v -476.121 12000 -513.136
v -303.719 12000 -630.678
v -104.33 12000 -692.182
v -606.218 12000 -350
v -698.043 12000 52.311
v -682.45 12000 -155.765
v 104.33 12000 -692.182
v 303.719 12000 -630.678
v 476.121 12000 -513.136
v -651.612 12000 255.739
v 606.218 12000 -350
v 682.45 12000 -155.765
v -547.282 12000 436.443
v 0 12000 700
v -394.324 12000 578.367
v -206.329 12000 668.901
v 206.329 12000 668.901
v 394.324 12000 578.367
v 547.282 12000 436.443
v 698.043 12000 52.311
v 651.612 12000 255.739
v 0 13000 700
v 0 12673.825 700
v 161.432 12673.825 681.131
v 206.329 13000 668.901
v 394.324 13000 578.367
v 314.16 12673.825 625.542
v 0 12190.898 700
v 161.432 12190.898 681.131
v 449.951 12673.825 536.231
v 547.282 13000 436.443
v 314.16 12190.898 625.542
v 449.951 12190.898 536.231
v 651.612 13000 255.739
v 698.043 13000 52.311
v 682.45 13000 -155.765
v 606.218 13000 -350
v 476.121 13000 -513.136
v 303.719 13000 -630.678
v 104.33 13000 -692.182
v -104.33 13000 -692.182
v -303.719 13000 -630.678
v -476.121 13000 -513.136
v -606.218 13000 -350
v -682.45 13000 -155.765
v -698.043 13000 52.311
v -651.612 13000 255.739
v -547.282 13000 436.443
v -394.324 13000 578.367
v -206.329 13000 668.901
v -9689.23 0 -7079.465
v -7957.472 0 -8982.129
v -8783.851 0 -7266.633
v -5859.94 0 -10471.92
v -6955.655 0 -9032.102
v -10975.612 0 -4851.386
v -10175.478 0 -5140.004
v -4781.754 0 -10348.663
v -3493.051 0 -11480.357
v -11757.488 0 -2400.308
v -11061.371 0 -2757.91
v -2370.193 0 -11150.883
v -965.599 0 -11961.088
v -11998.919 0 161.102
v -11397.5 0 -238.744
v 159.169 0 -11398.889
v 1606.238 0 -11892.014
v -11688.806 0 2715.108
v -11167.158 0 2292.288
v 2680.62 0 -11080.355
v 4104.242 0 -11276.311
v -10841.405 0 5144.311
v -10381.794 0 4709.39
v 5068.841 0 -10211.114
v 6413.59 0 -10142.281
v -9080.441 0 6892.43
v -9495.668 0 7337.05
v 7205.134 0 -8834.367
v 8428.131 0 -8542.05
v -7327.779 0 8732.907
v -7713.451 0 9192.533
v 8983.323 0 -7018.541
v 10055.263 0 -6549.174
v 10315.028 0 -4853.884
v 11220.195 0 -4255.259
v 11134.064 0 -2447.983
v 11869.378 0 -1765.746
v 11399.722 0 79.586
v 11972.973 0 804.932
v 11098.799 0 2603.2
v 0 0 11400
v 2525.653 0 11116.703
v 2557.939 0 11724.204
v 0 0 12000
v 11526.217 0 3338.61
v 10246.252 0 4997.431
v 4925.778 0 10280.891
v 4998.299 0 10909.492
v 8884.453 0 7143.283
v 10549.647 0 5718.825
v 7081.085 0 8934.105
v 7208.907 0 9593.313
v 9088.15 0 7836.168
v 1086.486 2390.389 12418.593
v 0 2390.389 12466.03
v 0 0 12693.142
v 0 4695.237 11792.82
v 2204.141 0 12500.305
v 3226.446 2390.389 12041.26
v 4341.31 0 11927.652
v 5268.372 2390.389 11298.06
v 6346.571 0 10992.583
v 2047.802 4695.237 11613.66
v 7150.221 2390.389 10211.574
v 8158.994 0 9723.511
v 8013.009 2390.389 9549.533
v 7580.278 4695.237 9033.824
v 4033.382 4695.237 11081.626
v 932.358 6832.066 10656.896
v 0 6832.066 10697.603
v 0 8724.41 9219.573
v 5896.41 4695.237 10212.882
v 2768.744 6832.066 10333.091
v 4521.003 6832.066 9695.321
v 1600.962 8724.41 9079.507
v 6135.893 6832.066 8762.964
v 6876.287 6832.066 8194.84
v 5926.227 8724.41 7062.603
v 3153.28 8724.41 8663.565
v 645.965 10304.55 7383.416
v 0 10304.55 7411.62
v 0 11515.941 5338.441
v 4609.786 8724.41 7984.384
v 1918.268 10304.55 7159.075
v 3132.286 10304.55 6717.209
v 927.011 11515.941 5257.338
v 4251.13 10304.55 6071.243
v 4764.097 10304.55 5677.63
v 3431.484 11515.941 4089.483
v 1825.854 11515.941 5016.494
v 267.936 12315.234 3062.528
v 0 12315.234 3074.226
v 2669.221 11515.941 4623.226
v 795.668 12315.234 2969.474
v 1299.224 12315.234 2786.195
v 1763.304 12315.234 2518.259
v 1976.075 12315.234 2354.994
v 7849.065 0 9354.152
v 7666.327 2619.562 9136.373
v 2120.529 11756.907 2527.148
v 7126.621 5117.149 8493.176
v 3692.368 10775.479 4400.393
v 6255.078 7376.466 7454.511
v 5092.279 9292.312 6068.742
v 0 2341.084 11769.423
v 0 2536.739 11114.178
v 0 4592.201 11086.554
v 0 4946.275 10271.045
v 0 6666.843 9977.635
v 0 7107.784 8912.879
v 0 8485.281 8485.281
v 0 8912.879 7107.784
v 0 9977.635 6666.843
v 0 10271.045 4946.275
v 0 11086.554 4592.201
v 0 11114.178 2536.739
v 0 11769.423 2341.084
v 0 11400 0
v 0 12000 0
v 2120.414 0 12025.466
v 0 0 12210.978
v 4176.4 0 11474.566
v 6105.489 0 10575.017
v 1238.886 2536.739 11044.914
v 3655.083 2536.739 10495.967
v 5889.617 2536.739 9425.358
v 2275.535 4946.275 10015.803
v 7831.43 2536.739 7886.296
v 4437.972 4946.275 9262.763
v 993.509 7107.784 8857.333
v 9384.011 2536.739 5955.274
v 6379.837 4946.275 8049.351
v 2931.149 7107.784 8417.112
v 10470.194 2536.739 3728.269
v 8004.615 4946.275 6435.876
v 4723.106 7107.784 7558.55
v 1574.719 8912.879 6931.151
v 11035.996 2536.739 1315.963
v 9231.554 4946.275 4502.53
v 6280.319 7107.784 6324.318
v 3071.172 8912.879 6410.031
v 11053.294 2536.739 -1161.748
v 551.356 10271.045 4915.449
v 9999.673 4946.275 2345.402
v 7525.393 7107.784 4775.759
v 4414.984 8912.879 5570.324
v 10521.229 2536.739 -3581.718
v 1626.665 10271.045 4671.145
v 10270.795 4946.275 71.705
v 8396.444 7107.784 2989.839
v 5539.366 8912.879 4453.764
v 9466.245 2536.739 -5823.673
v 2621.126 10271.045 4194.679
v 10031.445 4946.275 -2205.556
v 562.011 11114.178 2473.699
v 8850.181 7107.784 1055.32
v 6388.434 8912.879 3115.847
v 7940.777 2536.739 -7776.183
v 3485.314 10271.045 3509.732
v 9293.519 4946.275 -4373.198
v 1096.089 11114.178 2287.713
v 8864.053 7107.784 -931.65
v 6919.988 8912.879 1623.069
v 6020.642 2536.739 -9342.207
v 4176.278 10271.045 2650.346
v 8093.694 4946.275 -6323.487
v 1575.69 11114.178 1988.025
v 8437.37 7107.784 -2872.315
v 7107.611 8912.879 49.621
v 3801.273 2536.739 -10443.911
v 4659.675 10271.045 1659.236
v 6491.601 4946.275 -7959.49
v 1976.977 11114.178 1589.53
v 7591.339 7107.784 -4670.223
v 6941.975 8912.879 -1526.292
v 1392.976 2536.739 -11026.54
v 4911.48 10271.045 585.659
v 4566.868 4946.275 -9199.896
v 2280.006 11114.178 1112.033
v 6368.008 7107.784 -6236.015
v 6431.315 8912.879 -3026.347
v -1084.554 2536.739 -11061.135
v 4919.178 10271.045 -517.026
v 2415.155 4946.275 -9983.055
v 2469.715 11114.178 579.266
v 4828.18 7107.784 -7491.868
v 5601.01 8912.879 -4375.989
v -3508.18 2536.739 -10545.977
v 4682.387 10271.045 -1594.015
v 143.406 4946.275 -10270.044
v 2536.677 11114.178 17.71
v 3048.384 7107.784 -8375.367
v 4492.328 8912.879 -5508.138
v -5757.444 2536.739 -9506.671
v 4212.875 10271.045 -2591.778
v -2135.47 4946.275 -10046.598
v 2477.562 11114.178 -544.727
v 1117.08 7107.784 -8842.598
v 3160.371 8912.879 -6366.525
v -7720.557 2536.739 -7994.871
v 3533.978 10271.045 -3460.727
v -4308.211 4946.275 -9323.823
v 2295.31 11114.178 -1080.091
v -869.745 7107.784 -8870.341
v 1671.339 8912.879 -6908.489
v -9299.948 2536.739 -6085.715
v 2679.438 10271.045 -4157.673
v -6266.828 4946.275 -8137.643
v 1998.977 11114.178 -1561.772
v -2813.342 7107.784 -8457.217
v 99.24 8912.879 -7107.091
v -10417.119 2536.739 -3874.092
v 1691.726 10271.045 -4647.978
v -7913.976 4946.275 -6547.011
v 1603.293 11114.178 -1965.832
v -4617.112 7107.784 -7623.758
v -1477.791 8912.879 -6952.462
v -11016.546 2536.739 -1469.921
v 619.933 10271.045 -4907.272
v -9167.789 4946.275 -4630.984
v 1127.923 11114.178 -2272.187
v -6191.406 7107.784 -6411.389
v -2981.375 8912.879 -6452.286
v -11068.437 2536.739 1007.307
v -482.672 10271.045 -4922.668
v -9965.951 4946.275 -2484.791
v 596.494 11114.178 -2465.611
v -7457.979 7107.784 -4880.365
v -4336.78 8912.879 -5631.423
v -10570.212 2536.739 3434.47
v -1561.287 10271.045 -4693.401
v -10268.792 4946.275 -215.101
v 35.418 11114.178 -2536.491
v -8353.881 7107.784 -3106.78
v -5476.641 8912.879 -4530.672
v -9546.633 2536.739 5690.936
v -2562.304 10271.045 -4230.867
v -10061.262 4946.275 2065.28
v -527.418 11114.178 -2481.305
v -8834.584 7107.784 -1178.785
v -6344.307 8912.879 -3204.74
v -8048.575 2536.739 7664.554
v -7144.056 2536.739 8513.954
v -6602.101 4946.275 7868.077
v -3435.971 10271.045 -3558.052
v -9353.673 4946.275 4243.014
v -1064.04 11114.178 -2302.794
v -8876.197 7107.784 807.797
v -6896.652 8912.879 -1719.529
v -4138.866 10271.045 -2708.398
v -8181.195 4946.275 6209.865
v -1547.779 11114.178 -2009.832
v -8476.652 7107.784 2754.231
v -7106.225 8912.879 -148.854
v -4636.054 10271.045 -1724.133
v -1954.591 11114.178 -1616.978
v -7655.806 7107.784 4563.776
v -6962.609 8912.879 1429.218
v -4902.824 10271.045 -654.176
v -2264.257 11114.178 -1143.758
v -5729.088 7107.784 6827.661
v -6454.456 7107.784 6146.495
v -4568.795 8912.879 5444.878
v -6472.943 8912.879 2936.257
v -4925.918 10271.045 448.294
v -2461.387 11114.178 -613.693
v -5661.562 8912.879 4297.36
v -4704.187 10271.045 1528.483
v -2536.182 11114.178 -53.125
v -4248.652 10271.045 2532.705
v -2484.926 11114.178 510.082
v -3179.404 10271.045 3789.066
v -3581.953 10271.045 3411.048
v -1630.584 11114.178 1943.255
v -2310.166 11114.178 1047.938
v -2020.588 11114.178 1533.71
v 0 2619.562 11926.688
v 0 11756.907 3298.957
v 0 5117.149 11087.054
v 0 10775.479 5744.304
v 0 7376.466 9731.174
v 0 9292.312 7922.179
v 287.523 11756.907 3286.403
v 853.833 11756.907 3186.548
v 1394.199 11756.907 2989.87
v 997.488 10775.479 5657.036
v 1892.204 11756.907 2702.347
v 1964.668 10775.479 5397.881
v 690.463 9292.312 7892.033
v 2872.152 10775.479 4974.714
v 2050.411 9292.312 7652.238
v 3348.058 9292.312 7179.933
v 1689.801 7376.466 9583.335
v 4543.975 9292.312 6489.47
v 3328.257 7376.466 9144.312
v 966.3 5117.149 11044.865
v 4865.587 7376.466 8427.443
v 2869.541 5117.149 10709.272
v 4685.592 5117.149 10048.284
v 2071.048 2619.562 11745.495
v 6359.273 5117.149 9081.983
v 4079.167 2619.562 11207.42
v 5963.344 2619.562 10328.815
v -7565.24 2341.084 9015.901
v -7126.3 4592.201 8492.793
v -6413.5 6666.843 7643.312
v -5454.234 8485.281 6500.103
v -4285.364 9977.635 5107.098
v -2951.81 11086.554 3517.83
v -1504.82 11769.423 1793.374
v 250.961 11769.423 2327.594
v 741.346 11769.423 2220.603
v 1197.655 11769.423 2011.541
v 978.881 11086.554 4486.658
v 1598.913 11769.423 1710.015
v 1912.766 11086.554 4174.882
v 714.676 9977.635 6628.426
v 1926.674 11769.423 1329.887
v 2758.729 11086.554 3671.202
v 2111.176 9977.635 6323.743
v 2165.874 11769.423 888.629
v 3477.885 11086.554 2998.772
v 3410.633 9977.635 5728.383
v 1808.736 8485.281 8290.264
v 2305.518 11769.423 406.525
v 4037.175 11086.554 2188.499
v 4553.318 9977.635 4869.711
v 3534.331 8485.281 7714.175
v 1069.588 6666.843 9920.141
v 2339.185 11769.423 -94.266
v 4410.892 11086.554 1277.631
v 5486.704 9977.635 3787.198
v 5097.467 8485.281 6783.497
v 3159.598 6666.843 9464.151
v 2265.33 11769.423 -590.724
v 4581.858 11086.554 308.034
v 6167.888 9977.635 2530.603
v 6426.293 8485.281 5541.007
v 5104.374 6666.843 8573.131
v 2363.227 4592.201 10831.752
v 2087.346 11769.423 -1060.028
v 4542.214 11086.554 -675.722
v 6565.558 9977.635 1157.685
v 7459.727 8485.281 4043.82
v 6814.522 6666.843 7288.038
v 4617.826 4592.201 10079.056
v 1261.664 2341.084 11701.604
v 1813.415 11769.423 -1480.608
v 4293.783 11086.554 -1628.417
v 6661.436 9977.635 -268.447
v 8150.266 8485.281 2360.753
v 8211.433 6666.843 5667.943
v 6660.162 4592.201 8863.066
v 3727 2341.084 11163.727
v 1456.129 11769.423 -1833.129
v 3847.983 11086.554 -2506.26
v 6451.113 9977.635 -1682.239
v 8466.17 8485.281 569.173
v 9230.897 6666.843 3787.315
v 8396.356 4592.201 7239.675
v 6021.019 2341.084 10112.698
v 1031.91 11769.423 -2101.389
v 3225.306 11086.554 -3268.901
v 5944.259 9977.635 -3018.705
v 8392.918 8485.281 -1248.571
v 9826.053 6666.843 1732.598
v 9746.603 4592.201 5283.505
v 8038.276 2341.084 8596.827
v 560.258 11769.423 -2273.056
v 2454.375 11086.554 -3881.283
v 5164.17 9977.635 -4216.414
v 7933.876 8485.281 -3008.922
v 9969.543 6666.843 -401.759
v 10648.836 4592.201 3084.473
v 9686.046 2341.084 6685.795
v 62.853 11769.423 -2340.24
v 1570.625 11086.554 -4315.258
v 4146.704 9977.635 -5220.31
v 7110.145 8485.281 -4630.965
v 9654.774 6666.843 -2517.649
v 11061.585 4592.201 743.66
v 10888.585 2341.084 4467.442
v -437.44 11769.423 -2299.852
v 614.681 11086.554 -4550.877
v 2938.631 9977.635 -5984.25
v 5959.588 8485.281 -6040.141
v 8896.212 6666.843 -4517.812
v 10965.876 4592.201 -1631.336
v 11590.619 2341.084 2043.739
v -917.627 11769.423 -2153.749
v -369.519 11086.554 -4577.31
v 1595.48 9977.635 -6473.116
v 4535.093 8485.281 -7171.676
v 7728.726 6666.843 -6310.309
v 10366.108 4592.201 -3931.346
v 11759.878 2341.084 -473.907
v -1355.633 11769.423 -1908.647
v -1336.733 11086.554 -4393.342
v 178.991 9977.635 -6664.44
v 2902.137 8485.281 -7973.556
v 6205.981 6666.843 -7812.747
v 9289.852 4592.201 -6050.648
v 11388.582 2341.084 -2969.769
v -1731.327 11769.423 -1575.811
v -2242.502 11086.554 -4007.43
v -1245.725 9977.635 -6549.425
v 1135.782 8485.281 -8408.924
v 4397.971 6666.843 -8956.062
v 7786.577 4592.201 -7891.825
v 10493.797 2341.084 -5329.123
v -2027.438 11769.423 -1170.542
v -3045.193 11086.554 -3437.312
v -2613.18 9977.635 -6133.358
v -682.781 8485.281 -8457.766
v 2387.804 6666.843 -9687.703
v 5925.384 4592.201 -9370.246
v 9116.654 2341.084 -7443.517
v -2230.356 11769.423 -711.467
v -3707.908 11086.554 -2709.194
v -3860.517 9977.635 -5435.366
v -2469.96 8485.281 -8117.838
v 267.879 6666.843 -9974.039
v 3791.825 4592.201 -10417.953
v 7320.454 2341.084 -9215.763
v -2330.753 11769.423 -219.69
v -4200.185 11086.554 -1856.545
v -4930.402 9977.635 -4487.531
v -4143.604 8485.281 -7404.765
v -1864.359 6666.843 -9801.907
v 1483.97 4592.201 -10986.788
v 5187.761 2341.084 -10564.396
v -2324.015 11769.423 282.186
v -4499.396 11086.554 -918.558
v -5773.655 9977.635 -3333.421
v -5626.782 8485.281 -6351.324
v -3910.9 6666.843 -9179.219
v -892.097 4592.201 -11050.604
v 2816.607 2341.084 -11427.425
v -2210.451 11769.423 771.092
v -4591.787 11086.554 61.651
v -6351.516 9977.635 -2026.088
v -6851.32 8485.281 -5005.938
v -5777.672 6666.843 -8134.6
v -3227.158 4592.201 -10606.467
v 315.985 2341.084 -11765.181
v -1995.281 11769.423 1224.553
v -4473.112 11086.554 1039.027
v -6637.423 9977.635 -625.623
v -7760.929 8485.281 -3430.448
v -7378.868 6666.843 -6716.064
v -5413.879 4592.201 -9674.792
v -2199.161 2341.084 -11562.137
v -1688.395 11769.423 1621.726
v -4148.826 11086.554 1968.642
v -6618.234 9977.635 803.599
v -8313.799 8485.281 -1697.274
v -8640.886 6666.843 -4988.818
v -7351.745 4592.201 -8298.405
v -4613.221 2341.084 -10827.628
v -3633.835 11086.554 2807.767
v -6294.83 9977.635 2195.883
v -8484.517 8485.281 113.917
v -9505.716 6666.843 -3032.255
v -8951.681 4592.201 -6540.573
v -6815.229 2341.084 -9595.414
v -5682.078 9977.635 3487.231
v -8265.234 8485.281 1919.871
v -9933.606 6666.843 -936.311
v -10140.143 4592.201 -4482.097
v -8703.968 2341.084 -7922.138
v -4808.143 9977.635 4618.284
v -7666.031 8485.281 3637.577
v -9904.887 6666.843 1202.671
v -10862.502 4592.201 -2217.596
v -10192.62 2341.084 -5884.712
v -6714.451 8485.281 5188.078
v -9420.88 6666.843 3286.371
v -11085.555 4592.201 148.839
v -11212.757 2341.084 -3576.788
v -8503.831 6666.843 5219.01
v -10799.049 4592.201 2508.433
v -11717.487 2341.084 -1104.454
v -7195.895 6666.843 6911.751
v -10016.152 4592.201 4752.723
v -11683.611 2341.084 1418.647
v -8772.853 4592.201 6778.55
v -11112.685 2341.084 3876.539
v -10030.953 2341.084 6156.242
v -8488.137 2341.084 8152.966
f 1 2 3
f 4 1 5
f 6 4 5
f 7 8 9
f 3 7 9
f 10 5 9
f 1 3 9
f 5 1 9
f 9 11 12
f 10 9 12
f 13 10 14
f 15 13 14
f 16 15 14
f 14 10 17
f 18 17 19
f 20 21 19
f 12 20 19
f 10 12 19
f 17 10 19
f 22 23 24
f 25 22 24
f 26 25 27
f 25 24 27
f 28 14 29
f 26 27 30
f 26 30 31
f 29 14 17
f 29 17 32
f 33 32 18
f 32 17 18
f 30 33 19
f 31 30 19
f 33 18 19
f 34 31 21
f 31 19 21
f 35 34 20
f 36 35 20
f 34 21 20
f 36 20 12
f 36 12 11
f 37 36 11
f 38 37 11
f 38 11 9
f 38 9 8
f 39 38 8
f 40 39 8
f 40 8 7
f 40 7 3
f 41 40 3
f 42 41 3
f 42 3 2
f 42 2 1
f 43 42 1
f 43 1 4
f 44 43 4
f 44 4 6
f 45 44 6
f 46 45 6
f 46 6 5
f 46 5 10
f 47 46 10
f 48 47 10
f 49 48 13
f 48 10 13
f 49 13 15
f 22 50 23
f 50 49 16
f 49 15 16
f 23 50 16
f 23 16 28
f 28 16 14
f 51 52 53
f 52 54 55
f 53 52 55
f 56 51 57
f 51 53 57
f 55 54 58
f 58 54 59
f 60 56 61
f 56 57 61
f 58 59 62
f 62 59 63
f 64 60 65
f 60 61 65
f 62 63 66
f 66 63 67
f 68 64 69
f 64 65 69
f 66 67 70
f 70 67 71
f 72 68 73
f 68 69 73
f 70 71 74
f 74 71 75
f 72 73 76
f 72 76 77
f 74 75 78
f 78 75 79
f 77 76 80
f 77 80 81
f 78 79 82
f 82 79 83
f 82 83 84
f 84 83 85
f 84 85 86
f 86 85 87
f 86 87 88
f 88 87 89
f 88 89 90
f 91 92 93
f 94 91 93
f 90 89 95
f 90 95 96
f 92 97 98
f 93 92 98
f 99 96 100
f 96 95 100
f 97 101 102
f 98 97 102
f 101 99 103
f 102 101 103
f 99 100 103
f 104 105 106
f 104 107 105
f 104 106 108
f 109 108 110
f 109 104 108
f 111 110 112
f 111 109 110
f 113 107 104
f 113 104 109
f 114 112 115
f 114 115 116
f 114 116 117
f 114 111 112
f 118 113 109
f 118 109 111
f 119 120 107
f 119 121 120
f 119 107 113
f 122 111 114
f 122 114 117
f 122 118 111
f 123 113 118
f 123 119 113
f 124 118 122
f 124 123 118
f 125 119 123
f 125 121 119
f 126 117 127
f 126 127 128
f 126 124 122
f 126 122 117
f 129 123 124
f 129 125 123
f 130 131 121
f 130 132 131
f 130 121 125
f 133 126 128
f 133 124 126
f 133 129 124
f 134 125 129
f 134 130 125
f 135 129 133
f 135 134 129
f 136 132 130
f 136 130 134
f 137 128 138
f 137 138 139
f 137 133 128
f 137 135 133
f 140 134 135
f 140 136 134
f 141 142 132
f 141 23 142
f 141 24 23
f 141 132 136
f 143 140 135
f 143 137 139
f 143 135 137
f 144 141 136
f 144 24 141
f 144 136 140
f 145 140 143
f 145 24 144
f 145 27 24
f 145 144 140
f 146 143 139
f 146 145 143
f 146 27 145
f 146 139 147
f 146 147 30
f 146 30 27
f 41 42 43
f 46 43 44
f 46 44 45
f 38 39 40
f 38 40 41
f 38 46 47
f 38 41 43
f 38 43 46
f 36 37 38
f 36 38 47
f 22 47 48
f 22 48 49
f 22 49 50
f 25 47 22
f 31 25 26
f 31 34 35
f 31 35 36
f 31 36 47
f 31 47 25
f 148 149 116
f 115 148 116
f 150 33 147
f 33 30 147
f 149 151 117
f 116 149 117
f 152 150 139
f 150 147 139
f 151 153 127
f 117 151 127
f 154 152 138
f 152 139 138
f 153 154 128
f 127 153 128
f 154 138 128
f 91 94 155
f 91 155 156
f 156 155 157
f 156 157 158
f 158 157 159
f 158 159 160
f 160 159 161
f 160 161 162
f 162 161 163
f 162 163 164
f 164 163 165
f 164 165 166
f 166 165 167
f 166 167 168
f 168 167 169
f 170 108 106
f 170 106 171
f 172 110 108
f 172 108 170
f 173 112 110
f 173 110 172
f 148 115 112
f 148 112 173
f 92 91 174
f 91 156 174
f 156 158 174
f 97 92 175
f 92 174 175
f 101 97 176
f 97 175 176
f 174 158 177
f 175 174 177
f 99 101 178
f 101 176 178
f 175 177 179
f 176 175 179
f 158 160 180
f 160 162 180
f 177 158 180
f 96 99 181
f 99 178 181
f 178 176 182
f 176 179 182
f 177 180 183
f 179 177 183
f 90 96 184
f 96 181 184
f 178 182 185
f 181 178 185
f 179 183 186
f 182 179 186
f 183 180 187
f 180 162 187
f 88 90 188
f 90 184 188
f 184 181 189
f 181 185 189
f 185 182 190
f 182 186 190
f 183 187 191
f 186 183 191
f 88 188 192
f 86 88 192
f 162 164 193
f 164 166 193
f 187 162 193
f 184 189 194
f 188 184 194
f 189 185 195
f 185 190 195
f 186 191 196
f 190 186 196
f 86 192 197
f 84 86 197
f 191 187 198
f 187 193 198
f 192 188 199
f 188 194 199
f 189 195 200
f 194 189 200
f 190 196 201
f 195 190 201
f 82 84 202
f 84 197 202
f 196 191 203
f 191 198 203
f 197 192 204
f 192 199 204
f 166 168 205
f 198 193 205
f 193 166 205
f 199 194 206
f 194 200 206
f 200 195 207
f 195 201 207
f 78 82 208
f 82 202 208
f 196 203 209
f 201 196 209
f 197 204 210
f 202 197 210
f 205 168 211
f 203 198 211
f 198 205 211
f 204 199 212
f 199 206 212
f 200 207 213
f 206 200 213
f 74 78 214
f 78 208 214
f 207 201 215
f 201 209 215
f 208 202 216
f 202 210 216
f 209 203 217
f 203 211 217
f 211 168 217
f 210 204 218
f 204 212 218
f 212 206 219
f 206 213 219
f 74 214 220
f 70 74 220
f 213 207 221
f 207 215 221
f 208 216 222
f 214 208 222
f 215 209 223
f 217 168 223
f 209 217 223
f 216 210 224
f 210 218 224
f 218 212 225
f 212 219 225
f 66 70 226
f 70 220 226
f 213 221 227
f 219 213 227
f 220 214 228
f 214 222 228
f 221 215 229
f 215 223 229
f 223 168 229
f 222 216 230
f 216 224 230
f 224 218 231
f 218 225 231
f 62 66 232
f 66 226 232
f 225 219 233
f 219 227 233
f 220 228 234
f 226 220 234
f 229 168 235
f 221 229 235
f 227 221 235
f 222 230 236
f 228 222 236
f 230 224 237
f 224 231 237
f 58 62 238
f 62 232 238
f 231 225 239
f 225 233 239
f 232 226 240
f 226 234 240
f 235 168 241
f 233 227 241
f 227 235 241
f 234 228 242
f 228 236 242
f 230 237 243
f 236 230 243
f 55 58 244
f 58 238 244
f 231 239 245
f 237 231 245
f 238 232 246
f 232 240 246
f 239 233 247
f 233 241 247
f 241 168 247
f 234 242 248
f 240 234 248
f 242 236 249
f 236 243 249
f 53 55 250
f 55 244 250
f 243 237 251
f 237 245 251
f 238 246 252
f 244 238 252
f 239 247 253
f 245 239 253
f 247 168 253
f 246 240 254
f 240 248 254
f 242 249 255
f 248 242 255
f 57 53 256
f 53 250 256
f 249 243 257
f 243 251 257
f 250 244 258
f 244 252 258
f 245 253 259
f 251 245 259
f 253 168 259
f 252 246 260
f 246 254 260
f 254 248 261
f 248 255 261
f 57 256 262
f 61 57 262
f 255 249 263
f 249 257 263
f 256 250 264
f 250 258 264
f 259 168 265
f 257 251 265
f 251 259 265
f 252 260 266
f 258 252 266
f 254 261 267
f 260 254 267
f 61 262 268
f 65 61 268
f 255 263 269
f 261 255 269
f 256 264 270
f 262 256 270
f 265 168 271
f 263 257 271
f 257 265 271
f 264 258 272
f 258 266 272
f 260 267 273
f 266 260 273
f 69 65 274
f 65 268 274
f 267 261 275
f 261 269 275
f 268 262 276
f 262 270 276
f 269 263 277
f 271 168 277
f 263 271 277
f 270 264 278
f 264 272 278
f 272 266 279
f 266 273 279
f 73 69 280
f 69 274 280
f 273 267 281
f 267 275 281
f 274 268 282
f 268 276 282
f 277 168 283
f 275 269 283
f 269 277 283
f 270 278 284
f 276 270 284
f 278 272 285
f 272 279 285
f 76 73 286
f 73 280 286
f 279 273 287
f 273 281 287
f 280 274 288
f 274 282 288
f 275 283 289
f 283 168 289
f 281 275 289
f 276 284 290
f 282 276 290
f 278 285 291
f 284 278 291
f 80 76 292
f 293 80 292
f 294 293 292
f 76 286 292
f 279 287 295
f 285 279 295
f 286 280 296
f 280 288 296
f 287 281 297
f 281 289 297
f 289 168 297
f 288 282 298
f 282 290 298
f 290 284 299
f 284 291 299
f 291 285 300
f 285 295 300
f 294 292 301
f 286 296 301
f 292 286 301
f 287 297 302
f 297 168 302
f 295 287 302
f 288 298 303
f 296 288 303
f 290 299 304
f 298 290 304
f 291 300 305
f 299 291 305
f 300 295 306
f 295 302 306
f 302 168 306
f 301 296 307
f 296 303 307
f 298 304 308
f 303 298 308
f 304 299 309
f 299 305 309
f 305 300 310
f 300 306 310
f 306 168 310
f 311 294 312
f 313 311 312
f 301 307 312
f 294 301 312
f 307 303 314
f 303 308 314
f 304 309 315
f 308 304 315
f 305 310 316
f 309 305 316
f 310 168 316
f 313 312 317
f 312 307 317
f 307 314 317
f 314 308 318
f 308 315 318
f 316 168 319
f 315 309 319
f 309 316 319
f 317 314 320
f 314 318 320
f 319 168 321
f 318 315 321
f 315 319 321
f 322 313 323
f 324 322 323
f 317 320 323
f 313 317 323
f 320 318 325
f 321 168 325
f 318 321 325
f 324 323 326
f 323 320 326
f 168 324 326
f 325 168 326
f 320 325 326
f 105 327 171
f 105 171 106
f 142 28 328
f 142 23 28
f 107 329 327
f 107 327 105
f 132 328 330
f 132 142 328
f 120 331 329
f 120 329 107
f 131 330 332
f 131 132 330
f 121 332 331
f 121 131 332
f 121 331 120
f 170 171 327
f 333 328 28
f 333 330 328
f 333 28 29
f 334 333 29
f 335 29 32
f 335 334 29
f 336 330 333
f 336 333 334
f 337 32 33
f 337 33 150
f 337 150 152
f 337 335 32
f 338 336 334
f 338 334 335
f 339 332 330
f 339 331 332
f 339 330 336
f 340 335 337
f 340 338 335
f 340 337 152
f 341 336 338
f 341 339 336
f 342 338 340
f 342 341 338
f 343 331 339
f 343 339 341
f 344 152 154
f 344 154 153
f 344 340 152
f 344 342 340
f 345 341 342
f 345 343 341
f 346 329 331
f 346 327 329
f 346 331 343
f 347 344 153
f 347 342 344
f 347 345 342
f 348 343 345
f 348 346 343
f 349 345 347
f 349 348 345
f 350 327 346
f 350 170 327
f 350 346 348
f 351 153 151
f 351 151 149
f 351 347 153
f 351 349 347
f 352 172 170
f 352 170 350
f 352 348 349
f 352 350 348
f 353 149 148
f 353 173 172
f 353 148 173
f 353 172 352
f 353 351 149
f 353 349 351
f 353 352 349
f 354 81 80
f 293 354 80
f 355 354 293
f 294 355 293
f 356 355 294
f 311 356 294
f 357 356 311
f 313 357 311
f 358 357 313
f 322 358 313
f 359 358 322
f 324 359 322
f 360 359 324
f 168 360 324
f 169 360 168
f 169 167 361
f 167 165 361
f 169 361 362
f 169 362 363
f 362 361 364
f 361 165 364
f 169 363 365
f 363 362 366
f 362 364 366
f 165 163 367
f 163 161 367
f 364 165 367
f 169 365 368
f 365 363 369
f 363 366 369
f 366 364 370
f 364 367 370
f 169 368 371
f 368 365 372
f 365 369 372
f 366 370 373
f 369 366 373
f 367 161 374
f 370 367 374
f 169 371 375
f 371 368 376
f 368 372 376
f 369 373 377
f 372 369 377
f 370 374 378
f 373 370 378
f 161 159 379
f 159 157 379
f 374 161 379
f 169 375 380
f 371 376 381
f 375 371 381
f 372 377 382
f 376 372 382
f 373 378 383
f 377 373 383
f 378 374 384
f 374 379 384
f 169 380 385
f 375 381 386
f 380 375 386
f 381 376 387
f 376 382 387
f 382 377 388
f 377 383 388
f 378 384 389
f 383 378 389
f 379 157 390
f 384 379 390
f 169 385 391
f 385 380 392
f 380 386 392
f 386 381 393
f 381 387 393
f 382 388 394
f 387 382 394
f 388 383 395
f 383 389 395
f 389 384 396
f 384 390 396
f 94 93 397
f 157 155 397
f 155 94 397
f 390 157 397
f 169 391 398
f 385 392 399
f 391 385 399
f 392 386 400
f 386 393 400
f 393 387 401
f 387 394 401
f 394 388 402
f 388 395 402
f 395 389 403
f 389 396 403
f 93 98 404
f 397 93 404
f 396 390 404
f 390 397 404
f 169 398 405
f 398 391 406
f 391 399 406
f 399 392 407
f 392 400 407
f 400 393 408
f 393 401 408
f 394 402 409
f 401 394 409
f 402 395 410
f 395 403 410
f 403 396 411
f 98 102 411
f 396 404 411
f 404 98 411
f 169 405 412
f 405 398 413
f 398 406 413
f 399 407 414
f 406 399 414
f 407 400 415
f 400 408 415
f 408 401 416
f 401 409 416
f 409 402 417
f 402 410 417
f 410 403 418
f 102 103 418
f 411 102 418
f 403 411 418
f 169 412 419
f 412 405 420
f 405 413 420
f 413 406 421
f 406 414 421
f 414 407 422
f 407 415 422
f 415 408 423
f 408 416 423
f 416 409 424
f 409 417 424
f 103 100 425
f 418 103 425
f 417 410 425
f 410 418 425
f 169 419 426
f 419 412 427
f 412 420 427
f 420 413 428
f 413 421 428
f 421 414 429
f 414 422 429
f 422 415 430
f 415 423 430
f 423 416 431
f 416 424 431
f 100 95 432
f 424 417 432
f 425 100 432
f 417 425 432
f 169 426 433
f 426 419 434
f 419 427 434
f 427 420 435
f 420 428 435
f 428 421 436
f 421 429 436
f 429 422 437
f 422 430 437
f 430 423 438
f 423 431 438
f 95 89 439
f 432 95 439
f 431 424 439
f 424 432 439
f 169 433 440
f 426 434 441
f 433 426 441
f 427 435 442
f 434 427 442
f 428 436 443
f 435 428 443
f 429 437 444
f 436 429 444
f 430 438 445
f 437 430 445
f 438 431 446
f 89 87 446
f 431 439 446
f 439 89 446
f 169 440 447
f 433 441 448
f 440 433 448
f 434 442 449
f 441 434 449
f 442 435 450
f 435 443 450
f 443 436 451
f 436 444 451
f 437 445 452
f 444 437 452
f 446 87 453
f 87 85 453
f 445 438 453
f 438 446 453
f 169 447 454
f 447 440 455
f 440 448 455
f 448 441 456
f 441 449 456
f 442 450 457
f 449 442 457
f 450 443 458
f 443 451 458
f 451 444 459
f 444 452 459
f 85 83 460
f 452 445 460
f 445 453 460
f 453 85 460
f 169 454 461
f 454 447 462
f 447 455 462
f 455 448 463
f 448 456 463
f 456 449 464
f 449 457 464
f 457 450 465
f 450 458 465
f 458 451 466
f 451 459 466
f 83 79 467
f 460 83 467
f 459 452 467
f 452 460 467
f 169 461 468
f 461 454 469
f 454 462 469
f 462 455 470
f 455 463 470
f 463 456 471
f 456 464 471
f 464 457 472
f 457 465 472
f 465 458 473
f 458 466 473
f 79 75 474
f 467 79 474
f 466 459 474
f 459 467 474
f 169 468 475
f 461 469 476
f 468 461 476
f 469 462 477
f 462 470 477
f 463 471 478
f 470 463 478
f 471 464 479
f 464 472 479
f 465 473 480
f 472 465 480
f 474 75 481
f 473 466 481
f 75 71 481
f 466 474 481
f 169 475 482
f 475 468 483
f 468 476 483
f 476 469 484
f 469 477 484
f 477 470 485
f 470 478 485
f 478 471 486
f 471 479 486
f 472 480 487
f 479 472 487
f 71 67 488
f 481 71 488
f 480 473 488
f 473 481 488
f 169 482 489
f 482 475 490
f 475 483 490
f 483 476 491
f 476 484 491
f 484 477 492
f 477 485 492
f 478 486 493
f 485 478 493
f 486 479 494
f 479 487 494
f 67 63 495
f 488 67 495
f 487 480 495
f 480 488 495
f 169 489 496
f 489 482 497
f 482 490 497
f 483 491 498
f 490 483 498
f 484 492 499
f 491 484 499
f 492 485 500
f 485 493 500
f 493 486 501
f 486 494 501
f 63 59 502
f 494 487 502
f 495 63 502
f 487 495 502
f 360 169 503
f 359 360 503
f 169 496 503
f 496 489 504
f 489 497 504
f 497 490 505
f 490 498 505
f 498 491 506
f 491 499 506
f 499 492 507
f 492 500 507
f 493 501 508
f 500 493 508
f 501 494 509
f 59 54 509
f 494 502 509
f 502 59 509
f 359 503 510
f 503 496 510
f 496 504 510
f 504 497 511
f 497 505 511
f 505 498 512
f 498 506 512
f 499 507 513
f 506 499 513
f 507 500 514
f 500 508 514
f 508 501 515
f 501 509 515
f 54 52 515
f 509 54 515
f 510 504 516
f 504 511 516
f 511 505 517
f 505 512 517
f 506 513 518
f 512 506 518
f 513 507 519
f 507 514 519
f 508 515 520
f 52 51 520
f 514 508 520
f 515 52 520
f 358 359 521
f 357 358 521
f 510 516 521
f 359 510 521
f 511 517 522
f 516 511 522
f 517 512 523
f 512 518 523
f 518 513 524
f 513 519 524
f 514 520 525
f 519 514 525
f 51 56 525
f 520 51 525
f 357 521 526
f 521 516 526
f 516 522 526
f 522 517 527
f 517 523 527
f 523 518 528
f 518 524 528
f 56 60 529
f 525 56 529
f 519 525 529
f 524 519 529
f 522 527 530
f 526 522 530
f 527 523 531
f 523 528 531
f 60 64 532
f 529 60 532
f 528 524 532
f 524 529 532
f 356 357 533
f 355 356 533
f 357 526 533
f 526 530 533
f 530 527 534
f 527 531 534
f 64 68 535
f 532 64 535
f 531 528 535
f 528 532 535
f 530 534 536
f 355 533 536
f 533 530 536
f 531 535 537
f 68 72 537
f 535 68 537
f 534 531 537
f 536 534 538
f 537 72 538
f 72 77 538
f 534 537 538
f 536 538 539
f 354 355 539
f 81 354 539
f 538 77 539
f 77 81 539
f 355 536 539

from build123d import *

# Parameters (mm, degrees)
REVOLVE1_ANGLE      = 320
REVOLVE2_ANGLE      = 40
SKETCH3_R           = 700
BOSS_EXTRUDE1_DEPTH = 1000


with BuildPart() as part:
    # Sketch1 → Revolve1 (revolve)
    with BuildSketch(Plane(origin=(0, 0, 0), x_dir=(0, 0, -1), z_dir=(1, 0, 0))):
        with BuildLine():
            Line((0, 11400), (0, 12000))
            ThreePointArc((0, 12000), (-8485.281374239, 8485.281374239), (-12000, 0))
            Line((-12000, 0), (-11400, 0))
            ThreePointArc((-11400, 0), (-8061.017305527, 8061.017305527), (0, 11400))
        make_face()
    revolve(axis=Axis((0, 11400, 0), (0, 1, 0)), revolution_arc=REVOLVE1_ANGLE)


with BuildPart() as body_2:
    # Sketch2 → Revolve2 (revolve)
    with BuildSketch(Plane(origin=(0, 0, 0), x_dir=(0, 0, -1), z_dir=(1, 0, 0))):
        with BuildLine():
            Line((-12210.978021133, 0), (-12693.141899801, 0))
            ThreePointArc((-12693.141899801, 0), (-8975.406711913, 8975.406711913), (0, 12693.141899801))
            Line((0, 12693.141899801), (0, 12210.978021133))
            ThreePointArc((0, 12210.978021133), (-8634.465363663, 8634.465363663), (-12210.978021133, 0))
        make_face()
    revolve(axis=Axis((0, 12210.978021133, 0), (0, 1, 0)), revolution_arc=REVOLVE2_ANGLE)

    # Sketch3 → Boss-Extrude1 (add)
    with BuildSketch(Plane(origin=(0, 12000, 0), x_dir=(1, 0, 0), z_dir=(0, 1, 0))):
        with Locations(Location((0, 0, 0), (0, 0, 270))):
            Circle(SKETCH3_R)
    extrude(amount=BOSS_EXTRUDE1_DEPTH)


solid = Compound([part.part, body_2.part])
